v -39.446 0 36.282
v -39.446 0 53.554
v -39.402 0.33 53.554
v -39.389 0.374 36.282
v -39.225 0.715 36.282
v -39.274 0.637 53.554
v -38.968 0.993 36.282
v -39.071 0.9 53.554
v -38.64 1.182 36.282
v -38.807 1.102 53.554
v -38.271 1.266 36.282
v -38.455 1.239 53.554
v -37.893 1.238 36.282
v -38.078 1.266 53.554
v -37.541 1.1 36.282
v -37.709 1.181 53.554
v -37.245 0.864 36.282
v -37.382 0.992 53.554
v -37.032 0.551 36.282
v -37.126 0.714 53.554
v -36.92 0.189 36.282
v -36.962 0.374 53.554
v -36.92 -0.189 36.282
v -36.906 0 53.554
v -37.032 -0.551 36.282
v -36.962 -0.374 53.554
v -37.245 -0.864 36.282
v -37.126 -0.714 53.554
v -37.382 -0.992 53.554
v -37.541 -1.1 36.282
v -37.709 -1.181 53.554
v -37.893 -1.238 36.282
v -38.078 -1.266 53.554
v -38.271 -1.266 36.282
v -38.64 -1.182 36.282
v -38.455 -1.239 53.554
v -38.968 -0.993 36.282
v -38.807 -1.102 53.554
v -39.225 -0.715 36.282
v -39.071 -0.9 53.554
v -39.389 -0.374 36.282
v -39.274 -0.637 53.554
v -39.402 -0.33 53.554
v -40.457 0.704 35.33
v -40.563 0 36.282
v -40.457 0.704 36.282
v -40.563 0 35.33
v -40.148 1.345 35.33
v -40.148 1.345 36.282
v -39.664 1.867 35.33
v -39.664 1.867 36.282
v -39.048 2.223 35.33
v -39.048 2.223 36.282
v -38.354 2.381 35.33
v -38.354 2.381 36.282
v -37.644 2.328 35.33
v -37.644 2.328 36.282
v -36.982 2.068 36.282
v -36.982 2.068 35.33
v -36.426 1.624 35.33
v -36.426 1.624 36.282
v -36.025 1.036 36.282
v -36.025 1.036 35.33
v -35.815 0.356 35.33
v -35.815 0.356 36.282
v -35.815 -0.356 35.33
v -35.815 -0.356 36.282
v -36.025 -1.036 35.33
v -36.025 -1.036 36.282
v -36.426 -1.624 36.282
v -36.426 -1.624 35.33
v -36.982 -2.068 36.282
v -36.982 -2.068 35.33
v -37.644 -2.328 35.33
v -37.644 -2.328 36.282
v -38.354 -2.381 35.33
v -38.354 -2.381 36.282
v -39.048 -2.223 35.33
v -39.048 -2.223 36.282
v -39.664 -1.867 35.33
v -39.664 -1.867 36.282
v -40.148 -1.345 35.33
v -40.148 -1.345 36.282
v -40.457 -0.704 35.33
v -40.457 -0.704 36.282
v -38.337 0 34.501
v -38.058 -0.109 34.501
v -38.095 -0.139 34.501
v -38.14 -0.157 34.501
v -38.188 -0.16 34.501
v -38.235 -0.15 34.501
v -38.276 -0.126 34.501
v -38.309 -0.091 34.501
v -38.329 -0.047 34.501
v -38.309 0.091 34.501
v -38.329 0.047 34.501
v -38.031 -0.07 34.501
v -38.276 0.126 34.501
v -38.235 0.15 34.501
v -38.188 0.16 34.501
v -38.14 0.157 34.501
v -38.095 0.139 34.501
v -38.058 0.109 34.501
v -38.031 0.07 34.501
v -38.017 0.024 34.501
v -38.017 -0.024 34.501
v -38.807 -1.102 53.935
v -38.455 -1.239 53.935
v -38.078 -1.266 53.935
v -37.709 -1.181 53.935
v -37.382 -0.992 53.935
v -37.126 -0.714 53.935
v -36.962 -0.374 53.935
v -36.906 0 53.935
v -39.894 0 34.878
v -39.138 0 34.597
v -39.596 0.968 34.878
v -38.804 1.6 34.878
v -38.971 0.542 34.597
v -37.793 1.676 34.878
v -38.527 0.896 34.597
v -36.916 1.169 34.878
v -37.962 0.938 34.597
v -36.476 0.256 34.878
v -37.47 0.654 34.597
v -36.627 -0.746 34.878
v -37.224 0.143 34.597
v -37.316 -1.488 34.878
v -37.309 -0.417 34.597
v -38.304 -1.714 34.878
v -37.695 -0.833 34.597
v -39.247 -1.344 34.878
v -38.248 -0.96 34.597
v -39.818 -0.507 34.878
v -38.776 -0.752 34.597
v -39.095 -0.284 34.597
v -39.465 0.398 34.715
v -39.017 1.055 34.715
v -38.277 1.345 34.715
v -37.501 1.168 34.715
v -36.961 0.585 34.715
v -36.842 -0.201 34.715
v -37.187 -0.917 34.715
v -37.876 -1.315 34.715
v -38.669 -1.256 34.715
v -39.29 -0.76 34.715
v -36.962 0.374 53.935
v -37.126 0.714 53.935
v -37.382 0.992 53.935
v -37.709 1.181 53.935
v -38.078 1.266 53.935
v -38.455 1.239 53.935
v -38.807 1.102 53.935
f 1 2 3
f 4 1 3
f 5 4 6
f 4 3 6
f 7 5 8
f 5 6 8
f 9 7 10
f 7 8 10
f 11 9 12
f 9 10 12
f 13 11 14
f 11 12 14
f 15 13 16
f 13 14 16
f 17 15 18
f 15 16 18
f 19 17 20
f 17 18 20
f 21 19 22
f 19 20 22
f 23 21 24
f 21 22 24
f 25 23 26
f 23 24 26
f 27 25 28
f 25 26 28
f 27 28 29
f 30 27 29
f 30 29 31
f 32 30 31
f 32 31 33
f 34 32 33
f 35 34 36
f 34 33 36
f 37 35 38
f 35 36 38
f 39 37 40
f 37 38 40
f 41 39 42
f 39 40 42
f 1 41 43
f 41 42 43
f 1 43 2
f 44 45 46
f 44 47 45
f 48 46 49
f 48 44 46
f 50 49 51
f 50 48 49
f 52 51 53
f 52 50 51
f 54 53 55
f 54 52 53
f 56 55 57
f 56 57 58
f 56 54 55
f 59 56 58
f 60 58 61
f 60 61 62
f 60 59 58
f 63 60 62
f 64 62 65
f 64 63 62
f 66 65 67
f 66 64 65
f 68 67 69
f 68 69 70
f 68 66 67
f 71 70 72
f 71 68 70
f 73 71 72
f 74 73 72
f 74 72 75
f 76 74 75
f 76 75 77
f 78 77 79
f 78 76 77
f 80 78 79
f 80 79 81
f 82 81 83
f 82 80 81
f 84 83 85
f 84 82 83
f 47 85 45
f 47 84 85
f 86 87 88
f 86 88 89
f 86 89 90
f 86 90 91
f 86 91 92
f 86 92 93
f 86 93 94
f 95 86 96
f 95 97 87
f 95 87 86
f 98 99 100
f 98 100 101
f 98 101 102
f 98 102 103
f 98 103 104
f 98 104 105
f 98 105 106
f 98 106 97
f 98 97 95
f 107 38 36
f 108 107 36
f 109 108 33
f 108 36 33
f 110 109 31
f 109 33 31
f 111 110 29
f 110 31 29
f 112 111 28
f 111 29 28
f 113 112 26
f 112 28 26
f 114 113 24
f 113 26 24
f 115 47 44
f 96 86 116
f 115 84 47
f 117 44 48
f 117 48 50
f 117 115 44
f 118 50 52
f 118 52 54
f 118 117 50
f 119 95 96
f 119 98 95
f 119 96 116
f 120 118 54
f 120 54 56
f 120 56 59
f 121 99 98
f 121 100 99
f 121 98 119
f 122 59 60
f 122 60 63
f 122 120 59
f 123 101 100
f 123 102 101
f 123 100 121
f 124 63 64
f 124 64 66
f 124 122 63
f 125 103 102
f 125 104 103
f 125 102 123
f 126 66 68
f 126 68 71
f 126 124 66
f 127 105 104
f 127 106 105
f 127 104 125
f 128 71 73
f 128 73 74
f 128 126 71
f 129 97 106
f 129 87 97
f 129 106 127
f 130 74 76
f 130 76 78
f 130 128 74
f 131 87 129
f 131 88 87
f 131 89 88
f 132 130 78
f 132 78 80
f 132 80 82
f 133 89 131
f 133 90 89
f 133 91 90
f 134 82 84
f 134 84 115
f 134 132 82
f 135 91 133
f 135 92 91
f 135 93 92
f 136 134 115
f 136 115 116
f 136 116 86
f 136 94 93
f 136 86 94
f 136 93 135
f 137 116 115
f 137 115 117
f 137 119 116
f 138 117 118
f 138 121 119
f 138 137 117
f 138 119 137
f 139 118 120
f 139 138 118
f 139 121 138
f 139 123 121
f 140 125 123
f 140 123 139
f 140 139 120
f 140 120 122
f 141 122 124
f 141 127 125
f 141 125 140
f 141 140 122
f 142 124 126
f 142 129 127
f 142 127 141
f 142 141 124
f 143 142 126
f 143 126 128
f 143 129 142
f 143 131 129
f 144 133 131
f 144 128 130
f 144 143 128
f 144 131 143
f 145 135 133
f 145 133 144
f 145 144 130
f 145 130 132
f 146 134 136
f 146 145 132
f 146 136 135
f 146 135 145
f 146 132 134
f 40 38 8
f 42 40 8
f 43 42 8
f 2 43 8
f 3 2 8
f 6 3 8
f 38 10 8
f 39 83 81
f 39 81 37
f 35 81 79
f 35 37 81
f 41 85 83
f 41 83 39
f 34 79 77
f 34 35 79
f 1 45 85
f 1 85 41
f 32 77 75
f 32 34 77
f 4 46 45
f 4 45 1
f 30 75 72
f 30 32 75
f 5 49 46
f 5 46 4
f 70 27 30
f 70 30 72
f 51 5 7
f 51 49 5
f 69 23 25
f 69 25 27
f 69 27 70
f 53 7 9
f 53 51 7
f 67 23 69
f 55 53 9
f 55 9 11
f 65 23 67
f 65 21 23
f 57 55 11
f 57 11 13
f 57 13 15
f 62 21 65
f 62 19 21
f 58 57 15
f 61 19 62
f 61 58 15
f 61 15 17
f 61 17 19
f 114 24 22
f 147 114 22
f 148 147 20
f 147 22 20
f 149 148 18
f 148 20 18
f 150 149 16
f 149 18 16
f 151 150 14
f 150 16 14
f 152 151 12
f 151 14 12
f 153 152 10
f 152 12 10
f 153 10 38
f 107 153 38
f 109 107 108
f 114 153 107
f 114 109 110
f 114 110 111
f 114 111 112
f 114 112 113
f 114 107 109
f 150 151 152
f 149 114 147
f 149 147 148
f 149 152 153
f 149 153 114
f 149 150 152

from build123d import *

# Parameters (mm, degrees)
F0_W     = 1.27
F0_H     = 17.272
F3_DEPTH = 0.381


# Not quite as in the source:
# - a feature names something its author has since deleted; it is built from what else it names


with BuildPart() as f1:
    # F0 (on Front) → F1 (revolve)
    with BuildSketch(Plane.XZ):
        with Locations((-38.810752406, 44.918222718)):
            Rectangle(F0_W, F0_H)
        with BuildLine():
            Line((-38.175752406, 36.282222718), (-39.445752406, 36.282222718))
            Line((-39.445752406, 36.282222718), (-40.563352406, 36.282222718))
            Line((-40.563352406, 36.282222718), (-40.563352406, 35.9659250826))
            Line((-40.563352406, 35.9659250826), (-40.563352406, 35.329721868))
            ThreePointArc((-40.563352406, 35.329721868), (-39.5245363872, 34.7150900066), (-38.3366011083, 34.5012657344))
            Line((-38.3366011083, 34.5012657344), (-38.175752406, 34.5012657344))
            Line((-38.175752406, 34.5012657344), (-38.175752406, 35.1264222169))
            Line((-38.175752406, 35.1264222169), (-38.175752406, 36.282222718))
        make_face()
    revolve(axis=Axis((-38.175752406, 0, 44.918222718), (0, 0, -1)))

    # F2 (on face) → F3 (join)
    with BuildSketch(Plane.XY.offset(53.554222718)):
        with BuildLine():
            Line((-38.8069041073, 1.1020651206), (-38.8069041073, 0))
            Line((-38.8069041073, 0), (-38.8069041073, -1.1020651206))
            ThreePointArc((-38.8069041073, -1.1020651206), (-37.5388311631, -1.0987407931), (-36.905752406, 0))
            ThreePointArc((-36.905752406, 0), (-37.5388311631, 1.0987407931), (-38.8069041073, 1.1020651206))
        make_face()
    extrude(amount=F3_DEPTH)


solid = f1.part
